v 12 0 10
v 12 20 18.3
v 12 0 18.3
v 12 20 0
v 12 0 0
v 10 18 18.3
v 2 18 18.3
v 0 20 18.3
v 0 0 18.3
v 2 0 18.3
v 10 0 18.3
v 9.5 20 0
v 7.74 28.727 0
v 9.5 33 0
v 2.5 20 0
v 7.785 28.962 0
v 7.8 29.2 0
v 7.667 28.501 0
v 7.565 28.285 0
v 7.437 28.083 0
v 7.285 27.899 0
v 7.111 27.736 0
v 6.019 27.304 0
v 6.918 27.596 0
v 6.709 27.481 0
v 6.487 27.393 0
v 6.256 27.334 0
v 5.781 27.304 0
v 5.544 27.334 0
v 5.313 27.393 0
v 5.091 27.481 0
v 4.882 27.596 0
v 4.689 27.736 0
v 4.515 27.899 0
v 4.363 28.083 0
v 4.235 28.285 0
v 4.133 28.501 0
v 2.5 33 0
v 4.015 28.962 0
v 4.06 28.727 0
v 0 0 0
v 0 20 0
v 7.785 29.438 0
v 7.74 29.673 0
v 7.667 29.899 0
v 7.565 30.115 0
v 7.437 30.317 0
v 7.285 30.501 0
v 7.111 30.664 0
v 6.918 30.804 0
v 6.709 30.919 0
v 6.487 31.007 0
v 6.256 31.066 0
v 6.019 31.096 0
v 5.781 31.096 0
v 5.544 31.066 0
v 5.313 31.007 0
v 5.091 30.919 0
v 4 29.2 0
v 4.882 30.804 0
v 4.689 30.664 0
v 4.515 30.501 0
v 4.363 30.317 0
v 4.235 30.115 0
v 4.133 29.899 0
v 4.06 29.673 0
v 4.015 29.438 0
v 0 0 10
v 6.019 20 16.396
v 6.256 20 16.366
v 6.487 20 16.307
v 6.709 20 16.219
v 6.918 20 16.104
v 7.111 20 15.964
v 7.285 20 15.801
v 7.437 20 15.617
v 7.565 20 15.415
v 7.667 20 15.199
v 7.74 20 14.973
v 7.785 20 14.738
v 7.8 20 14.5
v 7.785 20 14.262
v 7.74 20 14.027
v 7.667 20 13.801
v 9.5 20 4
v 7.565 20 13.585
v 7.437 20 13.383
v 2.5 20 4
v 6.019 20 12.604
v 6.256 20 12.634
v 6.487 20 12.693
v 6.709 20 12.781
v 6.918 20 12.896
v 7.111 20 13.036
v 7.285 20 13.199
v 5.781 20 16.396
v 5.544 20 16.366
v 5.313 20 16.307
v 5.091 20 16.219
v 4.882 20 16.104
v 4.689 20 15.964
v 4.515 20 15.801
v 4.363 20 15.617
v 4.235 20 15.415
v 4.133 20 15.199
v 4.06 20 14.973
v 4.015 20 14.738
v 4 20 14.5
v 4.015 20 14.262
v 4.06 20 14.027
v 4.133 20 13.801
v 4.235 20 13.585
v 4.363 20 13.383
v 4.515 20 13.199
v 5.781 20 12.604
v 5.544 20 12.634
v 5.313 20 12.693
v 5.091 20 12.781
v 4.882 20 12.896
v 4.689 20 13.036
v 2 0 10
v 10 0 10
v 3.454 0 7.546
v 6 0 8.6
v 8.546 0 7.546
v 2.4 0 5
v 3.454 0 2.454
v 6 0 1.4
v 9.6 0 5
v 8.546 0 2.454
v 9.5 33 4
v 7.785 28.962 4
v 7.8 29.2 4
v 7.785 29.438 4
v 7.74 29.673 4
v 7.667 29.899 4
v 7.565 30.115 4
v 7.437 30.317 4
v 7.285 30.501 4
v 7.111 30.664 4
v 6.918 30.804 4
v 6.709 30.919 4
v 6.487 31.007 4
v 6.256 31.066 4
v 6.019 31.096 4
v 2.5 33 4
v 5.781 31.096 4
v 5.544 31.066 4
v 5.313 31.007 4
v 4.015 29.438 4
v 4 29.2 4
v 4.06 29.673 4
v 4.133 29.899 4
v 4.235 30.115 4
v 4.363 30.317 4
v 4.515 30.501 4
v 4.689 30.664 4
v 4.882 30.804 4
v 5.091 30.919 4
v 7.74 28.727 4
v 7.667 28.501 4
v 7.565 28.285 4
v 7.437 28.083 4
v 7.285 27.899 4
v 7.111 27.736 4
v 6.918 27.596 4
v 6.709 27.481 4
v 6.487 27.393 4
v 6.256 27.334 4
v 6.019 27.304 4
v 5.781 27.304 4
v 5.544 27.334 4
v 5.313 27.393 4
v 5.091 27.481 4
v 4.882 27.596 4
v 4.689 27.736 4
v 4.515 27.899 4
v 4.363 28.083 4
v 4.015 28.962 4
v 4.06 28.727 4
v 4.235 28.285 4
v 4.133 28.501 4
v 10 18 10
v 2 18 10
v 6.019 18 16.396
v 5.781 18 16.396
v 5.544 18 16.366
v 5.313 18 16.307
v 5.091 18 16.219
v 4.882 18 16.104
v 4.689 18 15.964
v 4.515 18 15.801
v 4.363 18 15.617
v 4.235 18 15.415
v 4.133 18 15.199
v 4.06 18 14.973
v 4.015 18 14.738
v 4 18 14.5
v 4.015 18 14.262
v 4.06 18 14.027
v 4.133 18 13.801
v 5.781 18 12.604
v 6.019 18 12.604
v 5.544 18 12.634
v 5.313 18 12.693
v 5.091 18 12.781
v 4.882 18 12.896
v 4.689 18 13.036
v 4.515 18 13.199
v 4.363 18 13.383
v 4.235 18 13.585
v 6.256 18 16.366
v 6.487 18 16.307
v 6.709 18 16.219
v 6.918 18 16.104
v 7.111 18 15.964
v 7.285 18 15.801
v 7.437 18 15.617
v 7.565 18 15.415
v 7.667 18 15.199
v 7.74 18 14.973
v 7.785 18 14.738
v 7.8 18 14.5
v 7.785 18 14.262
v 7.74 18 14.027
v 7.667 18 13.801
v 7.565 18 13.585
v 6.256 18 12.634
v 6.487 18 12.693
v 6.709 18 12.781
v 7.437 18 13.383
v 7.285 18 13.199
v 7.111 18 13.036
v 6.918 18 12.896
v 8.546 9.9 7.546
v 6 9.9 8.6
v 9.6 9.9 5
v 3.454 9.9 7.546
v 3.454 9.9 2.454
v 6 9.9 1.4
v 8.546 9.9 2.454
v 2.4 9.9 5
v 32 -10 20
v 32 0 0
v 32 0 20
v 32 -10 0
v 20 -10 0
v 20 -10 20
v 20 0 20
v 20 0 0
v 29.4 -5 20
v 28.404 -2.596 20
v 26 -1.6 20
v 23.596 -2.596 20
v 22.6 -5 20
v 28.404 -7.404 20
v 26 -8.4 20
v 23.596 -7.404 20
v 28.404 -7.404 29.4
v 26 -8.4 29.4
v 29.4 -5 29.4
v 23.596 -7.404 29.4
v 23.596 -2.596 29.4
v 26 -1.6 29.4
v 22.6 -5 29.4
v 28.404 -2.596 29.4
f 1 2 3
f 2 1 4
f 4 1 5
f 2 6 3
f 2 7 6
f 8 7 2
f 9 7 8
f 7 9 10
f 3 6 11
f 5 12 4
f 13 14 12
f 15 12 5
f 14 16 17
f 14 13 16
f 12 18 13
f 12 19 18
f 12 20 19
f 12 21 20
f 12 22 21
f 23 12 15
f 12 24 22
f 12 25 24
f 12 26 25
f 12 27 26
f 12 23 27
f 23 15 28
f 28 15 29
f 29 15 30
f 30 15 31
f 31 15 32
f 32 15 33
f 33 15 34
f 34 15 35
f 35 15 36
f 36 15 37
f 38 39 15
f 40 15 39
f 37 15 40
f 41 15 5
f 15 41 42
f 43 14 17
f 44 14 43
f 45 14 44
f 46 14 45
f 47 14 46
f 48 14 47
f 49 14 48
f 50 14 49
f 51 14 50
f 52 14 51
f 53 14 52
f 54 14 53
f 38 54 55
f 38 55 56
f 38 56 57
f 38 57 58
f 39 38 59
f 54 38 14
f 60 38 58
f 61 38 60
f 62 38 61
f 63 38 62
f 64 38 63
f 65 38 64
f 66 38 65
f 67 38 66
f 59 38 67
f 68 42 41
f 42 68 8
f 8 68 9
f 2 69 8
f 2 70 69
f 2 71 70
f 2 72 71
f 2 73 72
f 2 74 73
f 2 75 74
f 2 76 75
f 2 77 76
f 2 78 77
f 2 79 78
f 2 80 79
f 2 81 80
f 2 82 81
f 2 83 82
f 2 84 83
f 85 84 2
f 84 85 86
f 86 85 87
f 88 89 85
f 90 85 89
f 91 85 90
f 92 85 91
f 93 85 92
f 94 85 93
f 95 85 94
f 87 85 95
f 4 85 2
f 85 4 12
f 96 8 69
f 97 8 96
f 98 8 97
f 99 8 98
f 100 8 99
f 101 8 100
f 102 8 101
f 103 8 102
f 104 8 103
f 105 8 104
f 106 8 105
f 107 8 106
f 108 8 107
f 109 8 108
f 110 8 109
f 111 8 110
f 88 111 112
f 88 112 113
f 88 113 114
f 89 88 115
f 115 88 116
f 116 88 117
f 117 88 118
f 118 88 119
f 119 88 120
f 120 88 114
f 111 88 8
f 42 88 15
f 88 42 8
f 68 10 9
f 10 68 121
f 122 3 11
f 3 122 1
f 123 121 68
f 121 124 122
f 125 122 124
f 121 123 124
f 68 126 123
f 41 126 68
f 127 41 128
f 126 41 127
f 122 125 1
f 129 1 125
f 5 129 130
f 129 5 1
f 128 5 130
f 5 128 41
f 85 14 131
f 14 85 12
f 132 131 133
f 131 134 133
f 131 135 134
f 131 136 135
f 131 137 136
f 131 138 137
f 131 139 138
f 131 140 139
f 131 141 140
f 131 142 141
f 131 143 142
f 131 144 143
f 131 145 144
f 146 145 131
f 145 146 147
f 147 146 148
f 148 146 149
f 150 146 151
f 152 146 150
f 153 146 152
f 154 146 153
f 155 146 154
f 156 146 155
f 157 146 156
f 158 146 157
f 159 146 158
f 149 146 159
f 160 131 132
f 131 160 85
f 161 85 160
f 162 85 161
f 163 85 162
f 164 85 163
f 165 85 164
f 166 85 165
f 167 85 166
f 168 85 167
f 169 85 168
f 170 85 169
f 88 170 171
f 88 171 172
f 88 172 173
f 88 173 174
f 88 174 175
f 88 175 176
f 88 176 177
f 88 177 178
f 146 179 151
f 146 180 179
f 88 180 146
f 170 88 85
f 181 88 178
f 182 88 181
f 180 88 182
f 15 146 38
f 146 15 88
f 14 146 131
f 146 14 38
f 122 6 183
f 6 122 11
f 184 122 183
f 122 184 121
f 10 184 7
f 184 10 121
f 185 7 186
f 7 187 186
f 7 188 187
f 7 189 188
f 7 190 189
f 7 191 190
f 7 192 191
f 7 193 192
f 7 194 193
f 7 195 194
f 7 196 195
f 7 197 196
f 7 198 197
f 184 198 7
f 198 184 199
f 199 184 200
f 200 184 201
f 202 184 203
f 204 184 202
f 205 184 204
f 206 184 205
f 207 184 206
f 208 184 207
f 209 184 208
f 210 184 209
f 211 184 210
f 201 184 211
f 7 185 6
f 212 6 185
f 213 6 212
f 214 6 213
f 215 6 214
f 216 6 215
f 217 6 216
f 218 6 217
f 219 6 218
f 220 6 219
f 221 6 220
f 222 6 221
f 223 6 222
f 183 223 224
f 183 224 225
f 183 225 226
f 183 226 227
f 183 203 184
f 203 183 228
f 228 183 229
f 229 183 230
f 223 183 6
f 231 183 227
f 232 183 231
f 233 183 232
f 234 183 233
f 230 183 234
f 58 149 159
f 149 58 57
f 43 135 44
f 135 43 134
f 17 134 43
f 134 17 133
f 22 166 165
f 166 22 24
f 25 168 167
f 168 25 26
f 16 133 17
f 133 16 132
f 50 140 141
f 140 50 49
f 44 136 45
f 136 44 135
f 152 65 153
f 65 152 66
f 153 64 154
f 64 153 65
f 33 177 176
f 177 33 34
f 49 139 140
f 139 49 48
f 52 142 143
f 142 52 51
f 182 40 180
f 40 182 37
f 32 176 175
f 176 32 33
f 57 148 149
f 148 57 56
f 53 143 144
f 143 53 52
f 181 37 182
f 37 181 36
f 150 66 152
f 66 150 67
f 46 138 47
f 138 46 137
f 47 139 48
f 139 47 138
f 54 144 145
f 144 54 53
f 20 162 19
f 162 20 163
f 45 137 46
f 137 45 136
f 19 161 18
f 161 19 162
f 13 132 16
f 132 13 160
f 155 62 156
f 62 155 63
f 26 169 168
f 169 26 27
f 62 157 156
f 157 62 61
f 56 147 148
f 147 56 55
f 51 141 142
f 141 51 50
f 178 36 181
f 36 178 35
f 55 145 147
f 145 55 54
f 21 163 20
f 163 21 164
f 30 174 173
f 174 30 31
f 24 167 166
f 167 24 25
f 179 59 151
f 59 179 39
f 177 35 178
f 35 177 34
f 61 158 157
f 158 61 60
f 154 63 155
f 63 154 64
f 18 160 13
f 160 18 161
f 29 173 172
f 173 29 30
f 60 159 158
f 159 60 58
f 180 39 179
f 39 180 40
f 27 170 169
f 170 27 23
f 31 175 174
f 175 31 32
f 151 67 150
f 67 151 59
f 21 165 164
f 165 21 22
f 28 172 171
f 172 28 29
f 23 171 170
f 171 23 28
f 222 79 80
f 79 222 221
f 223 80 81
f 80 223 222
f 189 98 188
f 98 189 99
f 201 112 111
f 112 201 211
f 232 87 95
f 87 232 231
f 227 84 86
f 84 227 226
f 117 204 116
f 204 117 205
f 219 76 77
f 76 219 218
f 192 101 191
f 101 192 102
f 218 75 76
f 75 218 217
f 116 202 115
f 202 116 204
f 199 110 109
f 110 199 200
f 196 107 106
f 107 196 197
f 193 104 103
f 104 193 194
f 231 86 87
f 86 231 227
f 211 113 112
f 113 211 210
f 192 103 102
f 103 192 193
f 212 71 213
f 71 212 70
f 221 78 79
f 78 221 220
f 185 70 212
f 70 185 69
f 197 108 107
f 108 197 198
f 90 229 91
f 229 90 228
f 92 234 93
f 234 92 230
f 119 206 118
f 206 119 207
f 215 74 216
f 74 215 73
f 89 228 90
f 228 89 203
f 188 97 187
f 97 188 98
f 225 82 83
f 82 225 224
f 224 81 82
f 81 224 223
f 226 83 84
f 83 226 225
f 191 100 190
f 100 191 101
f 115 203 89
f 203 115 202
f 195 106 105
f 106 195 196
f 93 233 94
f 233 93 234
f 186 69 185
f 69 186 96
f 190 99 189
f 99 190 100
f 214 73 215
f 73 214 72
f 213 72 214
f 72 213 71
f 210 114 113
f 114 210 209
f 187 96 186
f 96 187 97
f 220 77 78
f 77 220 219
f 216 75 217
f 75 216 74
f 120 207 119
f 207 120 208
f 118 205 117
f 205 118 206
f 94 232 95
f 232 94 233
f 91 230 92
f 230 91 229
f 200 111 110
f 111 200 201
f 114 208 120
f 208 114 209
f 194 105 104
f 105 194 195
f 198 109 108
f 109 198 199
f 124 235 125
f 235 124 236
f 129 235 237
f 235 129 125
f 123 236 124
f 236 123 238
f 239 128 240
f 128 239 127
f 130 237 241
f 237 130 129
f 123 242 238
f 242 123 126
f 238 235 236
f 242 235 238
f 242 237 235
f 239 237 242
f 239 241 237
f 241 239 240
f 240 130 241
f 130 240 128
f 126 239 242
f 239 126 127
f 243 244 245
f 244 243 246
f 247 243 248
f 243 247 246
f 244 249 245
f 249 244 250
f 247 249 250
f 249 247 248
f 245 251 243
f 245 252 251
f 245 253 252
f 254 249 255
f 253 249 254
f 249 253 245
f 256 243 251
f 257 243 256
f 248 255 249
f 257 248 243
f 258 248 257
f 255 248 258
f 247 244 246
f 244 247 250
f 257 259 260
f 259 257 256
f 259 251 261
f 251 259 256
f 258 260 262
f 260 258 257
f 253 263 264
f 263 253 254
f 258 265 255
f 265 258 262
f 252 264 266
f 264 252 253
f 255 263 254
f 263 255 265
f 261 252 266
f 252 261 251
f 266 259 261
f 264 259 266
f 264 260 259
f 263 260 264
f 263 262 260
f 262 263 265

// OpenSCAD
width   = 12;
height 	= 18.3;
depth	= 20;
thichness = 10;
thichness_hole = 2;
plugdia   = 7;

leg_width = 7;
leg_depth = 13;
leg_height = 4;
leg_height_decal = 0;
holes	= 3.8;


module handle_solid() {
	cube([ width, depth, height ]);
	translate([ (width - leg_width)/2, depth, leg_height_decal ])
		cube([ leg_width, leg_depth , leg_height ]);
}

module handle() {
	difference() {
		handle_solid();
		translate([ -1, -thichness*2, thichness ])
			cube([ width+2, depth, height ]);
		translate([ thichness_hole, -thichness_hole, thichness ])
			cube([ width-thichness_hole*2, depth, height ]);
		translate([ (width - leg_height + holes)/2, depth + leg_depth - holes, 0 ])
			cylinder( d = holes, h = 200, center = true, $fn = 50 );
		translate([ (width - leg_height + holes)/2, depth + leg_depth - holes, height - holes ])
			rotate([90,0,0])
			cylinder( d = holes, h = 200, center = true, $fn = 50 );
		connector( 0.2 );
	}
}

module connector( space ) {
	translate([width/2, thichness/2 - 0.1, thichness/2])
	rotate([90,0,0])
		cylinder( d = plugdia+space, h = depth / 2, $fn = 8, center=true );
}


module roundedRect(size, radius)
{
        x = size[0];
        y = size[1];
        z = size[2];

        linear_extrude(height=z)
                hull()
                {
                        // place 4 circles in the corners, with the given radius
                        translate([(-x/2)+(radius/2), (-y/2)+(radius/2), 0])
                                circle(r=radius, $fn=fn);

                        translate([(x/2)-(radius/2), (-y/2)+(radius/2), 0])
                                circle(r=radius, $fn=fn);

                        translate([(-x/2)+(radius/2), (y/2)-(radius/2), 0])
                                circle(r=radius, $fn=fn);

                        translate([(x/2)-(radius/2), (y/2)-(radius/2), 0])
                                circle(r=radius, $fn=fn);
                }
}

module male() {
	union() {
		cube([ width, depth, thichness ]);
		translate([0, depth - 0.5, 0])
			connector( -0.2 );
	}
}


handle();

translate([ 20, 0, 0 ]) rotate([90,0,0]) male();
